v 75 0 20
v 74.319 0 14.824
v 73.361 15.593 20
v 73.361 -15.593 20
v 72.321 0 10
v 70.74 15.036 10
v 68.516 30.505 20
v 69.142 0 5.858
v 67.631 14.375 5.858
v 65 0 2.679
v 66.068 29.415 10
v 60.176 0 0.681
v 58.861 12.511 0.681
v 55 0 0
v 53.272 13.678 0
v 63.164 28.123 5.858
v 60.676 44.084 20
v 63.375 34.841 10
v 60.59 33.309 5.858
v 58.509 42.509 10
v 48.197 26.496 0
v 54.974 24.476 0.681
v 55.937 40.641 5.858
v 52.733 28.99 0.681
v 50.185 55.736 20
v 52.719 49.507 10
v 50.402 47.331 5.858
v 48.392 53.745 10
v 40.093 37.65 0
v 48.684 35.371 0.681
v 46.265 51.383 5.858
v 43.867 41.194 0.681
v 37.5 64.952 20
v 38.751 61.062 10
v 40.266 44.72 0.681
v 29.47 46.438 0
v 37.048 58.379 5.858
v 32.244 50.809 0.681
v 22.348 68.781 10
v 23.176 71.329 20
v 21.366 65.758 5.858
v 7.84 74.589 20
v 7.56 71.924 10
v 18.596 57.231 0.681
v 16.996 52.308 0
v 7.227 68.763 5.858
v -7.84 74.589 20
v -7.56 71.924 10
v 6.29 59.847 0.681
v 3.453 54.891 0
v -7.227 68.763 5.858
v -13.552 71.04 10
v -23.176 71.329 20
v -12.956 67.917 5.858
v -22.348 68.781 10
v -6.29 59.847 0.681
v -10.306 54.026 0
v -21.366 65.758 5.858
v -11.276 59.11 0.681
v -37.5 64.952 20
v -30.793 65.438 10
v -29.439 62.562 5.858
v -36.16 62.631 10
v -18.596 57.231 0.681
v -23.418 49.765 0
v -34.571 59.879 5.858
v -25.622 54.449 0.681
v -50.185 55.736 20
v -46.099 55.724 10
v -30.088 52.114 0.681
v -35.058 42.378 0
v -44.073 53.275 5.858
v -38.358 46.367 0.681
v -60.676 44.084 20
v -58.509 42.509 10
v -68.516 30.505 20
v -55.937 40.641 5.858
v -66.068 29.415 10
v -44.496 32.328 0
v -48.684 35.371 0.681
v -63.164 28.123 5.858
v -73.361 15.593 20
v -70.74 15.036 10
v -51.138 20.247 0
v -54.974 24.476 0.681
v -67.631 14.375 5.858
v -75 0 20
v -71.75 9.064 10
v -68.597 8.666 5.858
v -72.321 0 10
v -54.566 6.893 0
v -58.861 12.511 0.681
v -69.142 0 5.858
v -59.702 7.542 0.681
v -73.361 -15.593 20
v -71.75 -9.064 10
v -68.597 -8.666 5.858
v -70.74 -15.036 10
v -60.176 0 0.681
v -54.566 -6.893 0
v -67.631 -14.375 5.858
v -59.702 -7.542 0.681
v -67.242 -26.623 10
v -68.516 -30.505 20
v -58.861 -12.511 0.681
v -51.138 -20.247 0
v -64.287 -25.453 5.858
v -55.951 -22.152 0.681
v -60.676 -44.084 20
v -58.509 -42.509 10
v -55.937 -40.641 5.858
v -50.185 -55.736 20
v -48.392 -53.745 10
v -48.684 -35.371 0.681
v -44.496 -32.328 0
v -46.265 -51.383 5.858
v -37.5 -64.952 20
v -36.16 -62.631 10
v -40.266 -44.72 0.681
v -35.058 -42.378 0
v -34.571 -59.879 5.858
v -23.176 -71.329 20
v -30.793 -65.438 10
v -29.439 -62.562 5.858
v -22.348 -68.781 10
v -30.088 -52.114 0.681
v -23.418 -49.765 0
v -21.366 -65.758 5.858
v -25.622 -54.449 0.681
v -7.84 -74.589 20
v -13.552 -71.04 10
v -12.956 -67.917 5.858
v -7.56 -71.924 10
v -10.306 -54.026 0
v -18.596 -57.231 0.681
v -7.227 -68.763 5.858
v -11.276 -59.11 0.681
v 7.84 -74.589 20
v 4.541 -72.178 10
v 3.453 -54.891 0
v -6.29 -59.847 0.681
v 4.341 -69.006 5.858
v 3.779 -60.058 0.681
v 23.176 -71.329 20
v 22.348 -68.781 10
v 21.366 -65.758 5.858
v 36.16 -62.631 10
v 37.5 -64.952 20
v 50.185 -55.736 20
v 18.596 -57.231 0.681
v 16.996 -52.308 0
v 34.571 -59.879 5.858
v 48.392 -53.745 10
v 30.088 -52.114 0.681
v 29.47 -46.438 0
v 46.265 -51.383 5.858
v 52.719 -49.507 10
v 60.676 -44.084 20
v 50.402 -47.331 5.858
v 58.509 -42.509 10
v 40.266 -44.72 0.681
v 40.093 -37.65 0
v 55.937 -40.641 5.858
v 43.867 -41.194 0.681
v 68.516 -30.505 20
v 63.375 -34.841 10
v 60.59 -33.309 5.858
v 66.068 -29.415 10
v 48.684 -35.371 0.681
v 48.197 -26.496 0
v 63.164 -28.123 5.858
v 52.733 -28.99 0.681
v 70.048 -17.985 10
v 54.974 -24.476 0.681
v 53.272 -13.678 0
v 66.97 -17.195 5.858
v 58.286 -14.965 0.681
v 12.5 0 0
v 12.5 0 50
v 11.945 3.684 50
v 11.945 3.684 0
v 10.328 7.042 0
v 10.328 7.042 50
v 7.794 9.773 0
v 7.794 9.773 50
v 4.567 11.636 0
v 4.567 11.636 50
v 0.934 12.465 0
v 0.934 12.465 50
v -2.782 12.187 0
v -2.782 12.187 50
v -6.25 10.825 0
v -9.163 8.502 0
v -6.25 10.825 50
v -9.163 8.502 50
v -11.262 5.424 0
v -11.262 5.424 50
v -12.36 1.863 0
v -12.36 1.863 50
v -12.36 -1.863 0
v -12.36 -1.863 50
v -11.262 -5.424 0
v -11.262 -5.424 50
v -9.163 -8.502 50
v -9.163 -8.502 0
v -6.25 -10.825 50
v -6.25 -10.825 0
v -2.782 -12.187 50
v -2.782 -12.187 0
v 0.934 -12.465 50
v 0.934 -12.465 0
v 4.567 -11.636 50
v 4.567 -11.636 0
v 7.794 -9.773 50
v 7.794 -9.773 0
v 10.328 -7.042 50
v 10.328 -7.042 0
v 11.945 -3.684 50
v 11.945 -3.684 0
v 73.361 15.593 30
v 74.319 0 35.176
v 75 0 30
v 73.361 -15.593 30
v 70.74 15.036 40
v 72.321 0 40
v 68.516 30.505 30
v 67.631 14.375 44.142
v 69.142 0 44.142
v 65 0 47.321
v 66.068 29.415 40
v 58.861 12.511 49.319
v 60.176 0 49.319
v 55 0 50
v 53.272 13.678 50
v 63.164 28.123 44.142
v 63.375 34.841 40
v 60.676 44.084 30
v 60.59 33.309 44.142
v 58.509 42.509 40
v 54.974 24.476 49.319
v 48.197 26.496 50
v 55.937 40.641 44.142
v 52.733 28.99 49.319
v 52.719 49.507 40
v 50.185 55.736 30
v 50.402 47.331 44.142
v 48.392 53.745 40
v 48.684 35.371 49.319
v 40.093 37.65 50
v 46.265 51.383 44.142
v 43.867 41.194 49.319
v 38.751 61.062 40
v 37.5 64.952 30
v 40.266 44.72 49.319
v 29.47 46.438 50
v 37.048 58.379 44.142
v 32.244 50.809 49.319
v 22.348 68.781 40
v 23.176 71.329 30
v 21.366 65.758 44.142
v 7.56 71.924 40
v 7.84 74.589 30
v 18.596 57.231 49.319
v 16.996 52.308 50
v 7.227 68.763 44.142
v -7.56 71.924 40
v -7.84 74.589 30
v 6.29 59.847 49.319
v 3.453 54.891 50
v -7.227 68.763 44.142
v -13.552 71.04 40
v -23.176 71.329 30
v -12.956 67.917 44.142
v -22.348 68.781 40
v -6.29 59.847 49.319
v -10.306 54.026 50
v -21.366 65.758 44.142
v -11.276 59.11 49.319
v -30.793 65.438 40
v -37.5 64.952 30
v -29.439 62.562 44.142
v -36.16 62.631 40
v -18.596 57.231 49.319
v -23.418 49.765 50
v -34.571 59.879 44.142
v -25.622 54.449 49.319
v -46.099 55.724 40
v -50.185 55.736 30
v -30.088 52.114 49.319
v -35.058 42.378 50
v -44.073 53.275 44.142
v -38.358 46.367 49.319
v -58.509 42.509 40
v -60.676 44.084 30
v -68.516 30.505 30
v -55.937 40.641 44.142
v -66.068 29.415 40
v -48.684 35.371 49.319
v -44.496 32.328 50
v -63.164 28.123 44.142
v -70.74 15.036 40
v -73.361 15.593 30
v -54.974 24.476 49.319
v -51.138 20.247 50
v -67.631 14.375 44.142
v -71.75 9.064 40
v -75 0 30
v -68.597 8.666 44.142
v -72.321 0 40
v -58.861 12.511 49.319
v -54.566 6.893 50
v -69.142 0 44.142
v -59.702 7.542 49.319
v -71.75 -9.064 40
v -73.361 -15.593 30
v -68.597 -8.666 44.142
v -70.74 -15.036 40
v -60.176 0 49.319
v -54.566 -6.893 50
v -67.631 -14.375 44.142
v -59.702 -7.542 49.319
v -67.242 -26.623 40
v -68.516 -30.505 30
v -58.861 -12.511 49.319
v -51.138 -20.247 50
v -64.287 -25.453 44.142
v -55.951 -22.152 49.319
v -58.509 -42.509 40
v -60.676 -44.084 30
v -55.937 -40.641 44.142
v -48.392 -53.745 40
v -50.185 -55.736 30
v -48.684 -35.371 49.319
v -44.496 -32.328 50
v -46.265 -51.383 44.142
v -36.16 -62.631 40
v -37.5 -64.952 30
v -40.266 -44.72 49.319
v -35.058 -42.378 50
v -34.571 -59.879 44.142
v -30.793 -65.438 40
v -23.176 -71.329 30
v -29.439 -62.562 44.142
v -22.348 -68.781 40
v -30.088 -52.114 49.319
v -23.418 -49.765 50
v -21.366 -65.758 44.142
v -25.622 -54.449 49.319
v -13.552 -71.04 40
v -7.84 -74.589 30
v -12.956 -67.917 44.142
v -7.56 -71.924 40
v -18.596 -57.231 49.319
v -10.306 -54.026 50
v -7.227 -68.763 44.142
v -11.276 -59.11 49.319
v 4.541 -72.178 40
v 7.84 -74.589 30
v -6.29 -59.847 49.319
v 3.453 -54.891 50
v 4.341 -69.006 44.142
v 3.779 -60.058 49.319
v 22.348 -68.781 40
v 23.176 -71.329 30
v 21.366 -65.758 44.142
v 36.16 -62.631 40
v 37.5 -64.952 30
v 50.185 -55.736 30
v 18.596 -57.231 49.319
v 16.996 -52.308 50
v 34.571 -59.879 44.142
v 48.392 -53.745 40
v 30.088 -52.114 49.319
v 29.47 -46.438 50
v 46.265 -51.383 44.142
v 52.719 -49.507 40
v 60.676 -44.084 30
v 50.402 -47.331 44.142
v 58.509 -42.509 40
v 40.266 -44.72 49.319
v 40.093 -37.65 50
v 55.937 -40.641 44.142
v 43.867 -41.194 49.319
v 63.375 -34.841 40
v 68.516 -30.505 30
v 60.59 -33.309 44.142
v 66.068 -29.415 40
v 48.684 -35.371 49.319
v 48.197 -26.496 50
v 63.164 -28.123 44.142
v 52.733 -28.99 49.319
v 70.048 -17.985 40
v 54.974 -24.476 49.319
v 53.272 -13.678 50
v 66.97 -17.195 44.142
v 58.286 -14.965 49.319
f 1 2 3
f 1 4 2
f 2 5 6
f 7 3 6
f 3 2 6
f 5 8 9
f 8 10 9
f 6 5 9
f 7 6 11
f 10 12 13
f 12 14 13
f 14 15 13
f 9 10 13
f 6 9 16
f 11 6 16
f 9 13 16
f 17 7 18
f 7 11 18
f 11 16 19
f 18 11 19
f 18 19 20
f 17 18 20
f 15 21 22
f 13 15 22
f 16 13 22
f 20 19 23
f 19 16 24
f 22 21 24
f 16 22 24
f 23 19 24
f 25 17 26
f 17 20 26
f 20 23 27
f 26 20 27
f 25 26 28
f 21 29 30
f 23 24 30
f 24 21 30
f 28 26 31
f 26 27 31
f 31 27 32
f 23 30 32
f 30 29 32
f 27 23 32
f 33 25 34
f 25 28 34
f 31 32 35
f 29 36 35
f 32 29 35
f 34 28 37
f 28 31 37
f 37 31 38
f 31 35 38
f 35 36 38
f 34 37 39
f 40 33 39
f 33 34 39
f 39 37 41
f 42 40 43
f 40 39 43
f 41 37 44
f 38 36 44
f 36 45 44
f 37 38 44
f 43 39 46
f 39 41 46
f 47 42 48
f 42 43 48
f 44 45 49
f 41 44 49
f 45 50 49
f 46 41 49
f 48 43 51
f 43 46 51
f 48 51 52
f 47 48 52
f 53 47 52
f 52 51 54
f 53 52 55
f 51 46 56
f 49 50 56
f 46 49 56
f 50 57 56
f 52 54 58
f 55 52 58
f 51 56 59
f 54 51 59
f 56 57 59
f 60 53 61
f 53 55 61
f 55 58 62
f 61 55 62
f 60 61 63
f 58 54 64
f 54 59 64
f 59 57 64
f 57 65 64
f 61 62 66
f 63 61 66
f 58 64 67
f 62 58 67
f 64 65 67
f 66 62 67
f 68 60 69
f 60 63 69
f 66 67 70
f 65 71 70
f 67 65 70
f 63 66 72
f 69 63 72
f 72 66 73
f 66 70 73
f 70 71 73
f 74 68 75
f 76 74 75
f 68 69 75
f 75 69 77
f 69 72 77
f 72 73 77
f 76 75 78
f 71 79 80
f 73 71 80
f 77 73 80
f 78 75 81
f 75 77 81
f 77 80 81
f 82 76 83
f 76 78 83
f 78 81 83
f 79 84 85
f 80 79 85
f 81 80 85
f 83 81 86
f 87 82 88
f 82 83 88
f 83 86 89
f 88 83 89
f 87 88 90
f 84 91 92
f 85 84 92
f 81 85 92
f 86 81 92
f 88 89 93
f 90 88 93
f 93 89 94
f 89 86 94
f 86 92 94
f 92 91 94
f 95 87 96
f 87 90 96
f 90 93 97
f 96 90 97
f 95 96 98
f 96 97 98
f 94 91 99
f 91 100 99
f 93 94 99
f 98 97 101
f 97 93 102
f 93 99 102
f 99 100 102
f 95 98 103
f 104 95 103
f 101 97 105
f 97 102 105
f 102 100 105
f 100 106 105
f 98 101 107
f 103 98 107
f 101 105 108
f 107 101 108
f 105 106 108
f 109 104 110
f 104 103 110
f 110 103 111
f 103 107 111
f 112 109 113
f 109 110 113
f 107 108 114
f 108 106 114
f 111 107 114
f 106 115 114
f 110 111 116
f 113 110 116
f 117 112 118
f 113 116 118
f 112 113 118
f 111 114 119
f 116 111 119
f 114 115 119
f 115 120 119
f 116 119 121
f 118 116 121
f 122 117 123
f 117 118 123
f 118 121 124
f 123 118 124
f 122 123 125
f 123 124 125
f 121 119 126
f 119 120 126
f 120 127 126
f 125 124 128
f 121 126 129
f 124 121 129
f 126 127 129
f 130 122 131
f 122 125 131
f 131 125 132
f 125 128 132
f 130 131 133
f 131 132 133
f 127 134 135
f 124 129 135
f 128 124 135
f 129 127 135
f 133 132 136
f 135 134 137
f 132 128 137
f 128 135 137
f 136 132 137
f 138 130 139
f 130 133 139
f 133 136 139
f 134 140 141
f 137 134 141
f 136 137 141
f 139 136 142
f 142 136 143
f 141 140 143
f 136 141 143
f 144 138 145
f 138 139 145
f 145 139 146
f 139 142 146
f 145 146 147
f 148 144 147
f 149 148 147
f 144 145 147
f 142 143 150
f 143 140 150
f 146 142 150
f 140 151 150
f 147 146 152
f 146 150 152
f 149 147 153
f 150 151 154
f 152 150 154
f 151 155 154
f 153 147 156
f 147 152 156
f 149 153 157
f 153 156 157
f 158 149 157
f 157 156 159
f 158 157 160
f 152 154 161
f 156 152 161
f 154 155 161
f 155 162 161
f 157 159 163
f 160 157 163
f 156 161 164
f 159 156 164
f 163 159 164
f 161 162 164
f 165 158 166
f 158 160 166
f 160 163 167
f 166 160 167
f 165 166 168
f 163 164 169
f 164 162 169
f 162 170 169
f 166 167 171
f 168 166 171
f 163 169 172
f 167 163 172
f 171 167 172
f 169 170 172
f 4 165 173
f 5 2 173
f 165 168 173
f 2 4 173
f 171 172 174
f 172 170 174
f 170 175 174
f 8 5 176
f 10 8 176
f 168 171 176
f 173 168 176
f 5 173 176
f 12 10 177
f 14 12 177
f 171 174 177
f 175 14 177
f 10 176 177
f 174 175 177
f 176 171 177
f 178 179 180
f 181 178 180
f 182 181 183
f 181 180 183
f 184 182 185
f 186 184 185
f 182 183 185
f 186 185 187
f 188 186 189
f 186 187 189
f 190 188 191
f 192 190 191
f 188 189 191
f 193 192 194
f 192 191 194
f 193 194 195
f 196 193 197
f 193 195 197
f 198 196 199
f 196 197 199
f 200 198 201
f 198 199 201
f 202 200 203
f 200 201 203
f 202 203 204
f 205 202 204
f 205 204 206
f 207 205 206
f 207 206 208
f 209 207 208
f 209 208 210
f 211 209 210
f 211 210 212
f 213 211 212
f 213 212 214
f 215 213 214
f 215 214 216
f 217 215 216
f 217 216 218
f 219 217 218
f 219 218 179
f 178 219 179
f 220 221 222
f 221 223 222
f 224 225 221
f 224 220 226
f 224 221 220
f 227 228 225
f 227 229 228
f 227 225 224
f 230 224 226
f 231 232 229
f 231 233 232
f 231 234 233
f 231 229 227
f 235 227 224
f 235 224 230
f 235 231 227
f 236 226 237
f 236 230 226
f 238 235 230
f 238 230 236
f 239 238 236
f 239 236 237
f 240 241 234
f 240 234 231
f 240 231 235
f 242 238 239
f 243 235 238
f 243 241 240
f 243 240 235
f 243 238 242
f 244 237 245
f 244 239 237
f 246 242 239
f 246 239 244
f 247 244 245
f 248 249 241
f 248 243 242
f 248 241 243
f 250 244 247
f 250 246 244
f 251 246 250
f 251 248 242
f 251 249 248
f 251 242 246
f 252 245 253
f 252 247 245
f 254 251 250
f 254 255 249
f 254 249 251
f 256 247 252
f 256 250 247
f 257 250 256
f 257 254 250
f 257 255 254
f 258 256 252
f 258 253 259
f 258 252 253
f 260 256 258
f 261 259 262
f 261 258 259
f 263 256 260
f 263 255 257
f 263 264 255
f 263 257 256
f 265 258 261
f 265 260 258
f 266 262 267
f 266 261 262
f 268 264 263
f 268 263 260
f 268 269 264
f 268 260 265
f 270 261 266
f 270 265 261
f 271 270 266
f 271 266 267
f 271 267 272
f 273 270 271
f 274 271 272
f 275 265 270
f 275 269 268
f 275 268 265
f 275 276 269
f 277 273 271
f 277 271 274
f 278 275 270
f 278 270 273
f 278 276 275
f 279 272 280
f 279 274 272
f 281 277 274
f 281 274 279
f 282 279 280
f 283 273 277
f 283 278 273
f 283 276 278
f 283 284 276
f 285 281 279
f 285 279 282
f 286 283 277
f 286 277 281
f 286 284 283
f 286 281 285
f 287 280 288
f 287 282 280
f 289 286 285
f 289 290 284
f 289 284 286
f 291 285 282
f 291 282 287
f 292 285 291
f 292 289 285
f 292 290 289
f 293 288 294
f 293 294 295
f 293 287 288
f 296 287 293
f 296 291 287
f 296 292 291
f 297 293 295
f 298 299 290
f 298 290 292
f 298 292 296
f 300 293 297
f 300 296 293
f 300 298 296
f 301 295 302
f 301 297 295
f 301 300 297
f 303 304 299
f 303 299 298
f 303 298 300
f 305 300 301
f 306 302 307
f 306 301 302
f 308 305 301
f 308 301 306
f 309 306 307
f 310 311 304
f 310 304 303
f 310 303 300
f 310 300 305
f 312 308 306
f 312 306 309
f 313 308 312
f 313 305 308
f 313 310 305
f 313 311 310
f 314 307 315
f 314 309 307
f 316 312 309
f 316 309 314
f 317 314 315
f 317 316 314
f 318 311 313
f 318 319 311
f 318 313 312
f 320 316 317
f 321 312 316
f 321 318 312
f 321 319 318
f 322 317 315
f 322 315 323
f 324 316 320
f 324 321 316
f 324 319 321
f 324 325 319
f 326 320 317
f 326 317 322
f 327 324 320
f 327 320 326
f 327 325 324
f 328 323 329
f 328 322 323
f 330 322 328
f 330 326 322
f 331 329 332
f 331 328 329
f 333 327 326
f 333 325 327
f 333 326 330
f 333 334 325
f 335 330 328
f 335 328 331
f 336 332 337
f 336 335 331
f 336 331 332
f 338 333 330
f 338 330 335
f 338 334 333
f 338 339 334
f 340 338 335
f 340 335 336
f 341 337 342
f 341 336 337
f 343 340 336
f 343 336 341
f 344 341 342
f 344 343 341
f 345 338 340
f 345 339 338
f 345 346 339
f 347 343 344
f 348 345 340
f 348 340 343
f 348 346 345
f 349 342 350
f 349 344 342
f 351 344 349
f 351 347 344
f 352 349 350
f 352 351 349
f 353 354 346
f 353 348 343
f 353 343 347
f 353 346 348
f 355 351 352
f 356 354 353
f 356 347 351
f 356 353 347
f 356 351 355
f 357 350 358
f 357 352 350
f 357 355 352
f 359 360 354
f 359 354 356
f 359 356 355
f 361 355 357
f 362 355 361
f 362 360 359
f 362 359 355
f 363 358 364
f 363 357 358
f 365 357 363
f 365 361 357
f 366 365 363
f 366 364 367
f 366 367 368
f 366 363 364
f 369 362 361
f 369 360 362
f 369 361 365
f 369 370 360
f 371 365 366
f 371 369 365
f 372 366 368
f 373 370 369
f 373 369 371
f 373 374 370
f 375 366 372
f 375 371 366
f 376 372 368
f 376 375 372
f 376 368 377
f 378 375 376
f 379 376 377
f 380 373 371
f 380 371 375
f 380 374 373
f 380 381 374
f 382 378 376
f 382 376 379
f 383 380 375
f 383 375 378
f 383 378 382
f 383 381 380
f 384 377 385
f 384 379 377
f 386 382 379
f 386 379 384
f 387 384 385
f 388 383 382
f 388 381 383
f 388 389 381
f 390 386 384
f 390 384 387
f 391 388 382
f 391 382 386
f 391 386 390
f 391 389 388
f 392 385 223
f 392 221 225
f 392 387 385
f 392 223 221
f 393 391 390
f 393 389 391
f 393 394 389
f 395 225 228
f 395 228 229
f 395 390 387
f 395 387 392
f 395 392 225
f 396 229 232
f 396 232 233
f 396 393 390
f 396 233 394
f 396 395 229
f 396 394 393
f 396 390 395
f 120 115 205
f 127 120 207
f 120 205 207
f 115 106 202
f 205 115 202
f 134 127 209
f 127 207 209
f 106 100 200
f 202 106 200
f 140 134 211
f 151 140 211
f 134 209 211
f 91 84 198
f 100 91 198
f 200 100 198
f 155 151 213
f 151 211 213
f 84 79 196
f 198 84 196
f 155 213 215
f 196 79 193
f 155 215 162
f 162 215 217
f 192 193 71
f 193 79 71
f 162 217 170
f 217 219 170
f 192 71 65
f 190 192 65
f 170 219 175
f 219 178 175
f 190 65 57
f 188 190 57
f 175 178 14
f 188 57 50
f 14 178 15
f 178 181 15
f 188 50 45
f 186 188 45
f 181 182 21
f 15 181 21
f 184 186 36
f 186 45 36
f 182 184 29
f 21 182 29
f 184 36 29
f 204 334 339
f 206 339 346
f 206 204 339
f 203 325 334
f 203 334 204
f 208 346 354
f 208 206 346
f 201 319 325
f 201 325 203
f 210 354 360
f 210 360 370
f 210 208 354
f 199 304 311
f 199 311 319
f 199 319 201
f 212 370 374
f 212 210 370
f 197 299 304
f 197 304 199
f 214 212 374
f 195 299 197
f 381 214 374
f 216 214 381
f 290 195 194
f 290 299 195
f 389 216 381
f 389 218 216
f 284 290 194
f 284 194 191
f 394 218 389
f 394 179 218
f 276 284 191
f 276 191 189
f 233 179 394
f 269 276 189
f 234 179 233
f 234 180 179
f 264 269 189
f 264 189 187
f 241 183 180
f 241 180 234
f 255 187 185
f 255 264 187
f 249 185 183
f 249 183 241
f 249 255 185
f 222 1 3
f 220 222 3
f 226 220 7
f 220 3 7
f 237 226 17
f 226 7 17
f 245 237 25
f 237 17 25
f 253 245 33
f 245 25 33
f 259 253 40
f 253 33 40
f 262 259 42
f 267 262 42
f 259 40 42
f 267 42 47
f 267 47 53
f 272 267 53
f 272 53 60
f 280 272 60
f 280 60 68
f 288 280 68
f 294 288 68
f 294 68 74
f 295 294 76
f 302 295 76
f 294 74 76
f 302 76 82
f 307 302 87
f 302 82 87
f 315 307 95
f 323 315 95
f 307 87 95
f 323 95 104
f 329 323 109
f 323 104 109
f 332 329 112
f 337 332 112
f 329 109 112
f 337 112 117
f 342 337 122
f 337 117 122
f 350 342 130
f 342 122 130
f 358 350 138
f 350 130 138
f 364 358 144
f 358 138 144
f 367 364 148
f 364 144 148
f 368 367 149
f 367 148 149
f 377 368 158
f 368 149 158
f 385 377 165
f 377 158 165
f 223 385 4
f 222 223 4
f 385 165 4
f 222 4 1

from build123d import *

# Parameters (mm, degrees)
SKETCH1_R           = 75
BOSS_EXTRUDE1_DEPTH = 50
FILLET2_R           = 20
FILLET3_R           = 20
SKETCH2_R           = 12.5
CUT_EXTRUDE1_DEPTH  = 51


with BuildPart() as part:
    # Sketch1 → Boss-Extrude1 (new body)
    with BuildSketch(Plane.XY):
        Circle(SKETCH1_R)
    extrude(amount=BOSS_EXTRUDE1_DEPTH)

    # Fillet2
    fillet2_edges = [part.edges().sort_by_distance(p)[0] for p in [
        (-75, 0, 50),
    ]]
    fillet(fillet2_edges, radius=FILLET2_R)

    # Fillet3
    fillet3_edges = [part.edges().sort_by_distance(p)[0] for p in [
        (-75, 0, 0),
    ]]
    fillet(fillet3_edges, radius=FILLET3_R)

    # Sketch2 → Cut-Extrude1 (cut, through all)
    with BuildSketch(Plane.XY.offset(50)):
        Circle(SKETCH2_R)
    extrude(amount=-CUT_EXTRUDE1_DEPTH, mode=Mode.SUBTRACT)


solid = part.part
